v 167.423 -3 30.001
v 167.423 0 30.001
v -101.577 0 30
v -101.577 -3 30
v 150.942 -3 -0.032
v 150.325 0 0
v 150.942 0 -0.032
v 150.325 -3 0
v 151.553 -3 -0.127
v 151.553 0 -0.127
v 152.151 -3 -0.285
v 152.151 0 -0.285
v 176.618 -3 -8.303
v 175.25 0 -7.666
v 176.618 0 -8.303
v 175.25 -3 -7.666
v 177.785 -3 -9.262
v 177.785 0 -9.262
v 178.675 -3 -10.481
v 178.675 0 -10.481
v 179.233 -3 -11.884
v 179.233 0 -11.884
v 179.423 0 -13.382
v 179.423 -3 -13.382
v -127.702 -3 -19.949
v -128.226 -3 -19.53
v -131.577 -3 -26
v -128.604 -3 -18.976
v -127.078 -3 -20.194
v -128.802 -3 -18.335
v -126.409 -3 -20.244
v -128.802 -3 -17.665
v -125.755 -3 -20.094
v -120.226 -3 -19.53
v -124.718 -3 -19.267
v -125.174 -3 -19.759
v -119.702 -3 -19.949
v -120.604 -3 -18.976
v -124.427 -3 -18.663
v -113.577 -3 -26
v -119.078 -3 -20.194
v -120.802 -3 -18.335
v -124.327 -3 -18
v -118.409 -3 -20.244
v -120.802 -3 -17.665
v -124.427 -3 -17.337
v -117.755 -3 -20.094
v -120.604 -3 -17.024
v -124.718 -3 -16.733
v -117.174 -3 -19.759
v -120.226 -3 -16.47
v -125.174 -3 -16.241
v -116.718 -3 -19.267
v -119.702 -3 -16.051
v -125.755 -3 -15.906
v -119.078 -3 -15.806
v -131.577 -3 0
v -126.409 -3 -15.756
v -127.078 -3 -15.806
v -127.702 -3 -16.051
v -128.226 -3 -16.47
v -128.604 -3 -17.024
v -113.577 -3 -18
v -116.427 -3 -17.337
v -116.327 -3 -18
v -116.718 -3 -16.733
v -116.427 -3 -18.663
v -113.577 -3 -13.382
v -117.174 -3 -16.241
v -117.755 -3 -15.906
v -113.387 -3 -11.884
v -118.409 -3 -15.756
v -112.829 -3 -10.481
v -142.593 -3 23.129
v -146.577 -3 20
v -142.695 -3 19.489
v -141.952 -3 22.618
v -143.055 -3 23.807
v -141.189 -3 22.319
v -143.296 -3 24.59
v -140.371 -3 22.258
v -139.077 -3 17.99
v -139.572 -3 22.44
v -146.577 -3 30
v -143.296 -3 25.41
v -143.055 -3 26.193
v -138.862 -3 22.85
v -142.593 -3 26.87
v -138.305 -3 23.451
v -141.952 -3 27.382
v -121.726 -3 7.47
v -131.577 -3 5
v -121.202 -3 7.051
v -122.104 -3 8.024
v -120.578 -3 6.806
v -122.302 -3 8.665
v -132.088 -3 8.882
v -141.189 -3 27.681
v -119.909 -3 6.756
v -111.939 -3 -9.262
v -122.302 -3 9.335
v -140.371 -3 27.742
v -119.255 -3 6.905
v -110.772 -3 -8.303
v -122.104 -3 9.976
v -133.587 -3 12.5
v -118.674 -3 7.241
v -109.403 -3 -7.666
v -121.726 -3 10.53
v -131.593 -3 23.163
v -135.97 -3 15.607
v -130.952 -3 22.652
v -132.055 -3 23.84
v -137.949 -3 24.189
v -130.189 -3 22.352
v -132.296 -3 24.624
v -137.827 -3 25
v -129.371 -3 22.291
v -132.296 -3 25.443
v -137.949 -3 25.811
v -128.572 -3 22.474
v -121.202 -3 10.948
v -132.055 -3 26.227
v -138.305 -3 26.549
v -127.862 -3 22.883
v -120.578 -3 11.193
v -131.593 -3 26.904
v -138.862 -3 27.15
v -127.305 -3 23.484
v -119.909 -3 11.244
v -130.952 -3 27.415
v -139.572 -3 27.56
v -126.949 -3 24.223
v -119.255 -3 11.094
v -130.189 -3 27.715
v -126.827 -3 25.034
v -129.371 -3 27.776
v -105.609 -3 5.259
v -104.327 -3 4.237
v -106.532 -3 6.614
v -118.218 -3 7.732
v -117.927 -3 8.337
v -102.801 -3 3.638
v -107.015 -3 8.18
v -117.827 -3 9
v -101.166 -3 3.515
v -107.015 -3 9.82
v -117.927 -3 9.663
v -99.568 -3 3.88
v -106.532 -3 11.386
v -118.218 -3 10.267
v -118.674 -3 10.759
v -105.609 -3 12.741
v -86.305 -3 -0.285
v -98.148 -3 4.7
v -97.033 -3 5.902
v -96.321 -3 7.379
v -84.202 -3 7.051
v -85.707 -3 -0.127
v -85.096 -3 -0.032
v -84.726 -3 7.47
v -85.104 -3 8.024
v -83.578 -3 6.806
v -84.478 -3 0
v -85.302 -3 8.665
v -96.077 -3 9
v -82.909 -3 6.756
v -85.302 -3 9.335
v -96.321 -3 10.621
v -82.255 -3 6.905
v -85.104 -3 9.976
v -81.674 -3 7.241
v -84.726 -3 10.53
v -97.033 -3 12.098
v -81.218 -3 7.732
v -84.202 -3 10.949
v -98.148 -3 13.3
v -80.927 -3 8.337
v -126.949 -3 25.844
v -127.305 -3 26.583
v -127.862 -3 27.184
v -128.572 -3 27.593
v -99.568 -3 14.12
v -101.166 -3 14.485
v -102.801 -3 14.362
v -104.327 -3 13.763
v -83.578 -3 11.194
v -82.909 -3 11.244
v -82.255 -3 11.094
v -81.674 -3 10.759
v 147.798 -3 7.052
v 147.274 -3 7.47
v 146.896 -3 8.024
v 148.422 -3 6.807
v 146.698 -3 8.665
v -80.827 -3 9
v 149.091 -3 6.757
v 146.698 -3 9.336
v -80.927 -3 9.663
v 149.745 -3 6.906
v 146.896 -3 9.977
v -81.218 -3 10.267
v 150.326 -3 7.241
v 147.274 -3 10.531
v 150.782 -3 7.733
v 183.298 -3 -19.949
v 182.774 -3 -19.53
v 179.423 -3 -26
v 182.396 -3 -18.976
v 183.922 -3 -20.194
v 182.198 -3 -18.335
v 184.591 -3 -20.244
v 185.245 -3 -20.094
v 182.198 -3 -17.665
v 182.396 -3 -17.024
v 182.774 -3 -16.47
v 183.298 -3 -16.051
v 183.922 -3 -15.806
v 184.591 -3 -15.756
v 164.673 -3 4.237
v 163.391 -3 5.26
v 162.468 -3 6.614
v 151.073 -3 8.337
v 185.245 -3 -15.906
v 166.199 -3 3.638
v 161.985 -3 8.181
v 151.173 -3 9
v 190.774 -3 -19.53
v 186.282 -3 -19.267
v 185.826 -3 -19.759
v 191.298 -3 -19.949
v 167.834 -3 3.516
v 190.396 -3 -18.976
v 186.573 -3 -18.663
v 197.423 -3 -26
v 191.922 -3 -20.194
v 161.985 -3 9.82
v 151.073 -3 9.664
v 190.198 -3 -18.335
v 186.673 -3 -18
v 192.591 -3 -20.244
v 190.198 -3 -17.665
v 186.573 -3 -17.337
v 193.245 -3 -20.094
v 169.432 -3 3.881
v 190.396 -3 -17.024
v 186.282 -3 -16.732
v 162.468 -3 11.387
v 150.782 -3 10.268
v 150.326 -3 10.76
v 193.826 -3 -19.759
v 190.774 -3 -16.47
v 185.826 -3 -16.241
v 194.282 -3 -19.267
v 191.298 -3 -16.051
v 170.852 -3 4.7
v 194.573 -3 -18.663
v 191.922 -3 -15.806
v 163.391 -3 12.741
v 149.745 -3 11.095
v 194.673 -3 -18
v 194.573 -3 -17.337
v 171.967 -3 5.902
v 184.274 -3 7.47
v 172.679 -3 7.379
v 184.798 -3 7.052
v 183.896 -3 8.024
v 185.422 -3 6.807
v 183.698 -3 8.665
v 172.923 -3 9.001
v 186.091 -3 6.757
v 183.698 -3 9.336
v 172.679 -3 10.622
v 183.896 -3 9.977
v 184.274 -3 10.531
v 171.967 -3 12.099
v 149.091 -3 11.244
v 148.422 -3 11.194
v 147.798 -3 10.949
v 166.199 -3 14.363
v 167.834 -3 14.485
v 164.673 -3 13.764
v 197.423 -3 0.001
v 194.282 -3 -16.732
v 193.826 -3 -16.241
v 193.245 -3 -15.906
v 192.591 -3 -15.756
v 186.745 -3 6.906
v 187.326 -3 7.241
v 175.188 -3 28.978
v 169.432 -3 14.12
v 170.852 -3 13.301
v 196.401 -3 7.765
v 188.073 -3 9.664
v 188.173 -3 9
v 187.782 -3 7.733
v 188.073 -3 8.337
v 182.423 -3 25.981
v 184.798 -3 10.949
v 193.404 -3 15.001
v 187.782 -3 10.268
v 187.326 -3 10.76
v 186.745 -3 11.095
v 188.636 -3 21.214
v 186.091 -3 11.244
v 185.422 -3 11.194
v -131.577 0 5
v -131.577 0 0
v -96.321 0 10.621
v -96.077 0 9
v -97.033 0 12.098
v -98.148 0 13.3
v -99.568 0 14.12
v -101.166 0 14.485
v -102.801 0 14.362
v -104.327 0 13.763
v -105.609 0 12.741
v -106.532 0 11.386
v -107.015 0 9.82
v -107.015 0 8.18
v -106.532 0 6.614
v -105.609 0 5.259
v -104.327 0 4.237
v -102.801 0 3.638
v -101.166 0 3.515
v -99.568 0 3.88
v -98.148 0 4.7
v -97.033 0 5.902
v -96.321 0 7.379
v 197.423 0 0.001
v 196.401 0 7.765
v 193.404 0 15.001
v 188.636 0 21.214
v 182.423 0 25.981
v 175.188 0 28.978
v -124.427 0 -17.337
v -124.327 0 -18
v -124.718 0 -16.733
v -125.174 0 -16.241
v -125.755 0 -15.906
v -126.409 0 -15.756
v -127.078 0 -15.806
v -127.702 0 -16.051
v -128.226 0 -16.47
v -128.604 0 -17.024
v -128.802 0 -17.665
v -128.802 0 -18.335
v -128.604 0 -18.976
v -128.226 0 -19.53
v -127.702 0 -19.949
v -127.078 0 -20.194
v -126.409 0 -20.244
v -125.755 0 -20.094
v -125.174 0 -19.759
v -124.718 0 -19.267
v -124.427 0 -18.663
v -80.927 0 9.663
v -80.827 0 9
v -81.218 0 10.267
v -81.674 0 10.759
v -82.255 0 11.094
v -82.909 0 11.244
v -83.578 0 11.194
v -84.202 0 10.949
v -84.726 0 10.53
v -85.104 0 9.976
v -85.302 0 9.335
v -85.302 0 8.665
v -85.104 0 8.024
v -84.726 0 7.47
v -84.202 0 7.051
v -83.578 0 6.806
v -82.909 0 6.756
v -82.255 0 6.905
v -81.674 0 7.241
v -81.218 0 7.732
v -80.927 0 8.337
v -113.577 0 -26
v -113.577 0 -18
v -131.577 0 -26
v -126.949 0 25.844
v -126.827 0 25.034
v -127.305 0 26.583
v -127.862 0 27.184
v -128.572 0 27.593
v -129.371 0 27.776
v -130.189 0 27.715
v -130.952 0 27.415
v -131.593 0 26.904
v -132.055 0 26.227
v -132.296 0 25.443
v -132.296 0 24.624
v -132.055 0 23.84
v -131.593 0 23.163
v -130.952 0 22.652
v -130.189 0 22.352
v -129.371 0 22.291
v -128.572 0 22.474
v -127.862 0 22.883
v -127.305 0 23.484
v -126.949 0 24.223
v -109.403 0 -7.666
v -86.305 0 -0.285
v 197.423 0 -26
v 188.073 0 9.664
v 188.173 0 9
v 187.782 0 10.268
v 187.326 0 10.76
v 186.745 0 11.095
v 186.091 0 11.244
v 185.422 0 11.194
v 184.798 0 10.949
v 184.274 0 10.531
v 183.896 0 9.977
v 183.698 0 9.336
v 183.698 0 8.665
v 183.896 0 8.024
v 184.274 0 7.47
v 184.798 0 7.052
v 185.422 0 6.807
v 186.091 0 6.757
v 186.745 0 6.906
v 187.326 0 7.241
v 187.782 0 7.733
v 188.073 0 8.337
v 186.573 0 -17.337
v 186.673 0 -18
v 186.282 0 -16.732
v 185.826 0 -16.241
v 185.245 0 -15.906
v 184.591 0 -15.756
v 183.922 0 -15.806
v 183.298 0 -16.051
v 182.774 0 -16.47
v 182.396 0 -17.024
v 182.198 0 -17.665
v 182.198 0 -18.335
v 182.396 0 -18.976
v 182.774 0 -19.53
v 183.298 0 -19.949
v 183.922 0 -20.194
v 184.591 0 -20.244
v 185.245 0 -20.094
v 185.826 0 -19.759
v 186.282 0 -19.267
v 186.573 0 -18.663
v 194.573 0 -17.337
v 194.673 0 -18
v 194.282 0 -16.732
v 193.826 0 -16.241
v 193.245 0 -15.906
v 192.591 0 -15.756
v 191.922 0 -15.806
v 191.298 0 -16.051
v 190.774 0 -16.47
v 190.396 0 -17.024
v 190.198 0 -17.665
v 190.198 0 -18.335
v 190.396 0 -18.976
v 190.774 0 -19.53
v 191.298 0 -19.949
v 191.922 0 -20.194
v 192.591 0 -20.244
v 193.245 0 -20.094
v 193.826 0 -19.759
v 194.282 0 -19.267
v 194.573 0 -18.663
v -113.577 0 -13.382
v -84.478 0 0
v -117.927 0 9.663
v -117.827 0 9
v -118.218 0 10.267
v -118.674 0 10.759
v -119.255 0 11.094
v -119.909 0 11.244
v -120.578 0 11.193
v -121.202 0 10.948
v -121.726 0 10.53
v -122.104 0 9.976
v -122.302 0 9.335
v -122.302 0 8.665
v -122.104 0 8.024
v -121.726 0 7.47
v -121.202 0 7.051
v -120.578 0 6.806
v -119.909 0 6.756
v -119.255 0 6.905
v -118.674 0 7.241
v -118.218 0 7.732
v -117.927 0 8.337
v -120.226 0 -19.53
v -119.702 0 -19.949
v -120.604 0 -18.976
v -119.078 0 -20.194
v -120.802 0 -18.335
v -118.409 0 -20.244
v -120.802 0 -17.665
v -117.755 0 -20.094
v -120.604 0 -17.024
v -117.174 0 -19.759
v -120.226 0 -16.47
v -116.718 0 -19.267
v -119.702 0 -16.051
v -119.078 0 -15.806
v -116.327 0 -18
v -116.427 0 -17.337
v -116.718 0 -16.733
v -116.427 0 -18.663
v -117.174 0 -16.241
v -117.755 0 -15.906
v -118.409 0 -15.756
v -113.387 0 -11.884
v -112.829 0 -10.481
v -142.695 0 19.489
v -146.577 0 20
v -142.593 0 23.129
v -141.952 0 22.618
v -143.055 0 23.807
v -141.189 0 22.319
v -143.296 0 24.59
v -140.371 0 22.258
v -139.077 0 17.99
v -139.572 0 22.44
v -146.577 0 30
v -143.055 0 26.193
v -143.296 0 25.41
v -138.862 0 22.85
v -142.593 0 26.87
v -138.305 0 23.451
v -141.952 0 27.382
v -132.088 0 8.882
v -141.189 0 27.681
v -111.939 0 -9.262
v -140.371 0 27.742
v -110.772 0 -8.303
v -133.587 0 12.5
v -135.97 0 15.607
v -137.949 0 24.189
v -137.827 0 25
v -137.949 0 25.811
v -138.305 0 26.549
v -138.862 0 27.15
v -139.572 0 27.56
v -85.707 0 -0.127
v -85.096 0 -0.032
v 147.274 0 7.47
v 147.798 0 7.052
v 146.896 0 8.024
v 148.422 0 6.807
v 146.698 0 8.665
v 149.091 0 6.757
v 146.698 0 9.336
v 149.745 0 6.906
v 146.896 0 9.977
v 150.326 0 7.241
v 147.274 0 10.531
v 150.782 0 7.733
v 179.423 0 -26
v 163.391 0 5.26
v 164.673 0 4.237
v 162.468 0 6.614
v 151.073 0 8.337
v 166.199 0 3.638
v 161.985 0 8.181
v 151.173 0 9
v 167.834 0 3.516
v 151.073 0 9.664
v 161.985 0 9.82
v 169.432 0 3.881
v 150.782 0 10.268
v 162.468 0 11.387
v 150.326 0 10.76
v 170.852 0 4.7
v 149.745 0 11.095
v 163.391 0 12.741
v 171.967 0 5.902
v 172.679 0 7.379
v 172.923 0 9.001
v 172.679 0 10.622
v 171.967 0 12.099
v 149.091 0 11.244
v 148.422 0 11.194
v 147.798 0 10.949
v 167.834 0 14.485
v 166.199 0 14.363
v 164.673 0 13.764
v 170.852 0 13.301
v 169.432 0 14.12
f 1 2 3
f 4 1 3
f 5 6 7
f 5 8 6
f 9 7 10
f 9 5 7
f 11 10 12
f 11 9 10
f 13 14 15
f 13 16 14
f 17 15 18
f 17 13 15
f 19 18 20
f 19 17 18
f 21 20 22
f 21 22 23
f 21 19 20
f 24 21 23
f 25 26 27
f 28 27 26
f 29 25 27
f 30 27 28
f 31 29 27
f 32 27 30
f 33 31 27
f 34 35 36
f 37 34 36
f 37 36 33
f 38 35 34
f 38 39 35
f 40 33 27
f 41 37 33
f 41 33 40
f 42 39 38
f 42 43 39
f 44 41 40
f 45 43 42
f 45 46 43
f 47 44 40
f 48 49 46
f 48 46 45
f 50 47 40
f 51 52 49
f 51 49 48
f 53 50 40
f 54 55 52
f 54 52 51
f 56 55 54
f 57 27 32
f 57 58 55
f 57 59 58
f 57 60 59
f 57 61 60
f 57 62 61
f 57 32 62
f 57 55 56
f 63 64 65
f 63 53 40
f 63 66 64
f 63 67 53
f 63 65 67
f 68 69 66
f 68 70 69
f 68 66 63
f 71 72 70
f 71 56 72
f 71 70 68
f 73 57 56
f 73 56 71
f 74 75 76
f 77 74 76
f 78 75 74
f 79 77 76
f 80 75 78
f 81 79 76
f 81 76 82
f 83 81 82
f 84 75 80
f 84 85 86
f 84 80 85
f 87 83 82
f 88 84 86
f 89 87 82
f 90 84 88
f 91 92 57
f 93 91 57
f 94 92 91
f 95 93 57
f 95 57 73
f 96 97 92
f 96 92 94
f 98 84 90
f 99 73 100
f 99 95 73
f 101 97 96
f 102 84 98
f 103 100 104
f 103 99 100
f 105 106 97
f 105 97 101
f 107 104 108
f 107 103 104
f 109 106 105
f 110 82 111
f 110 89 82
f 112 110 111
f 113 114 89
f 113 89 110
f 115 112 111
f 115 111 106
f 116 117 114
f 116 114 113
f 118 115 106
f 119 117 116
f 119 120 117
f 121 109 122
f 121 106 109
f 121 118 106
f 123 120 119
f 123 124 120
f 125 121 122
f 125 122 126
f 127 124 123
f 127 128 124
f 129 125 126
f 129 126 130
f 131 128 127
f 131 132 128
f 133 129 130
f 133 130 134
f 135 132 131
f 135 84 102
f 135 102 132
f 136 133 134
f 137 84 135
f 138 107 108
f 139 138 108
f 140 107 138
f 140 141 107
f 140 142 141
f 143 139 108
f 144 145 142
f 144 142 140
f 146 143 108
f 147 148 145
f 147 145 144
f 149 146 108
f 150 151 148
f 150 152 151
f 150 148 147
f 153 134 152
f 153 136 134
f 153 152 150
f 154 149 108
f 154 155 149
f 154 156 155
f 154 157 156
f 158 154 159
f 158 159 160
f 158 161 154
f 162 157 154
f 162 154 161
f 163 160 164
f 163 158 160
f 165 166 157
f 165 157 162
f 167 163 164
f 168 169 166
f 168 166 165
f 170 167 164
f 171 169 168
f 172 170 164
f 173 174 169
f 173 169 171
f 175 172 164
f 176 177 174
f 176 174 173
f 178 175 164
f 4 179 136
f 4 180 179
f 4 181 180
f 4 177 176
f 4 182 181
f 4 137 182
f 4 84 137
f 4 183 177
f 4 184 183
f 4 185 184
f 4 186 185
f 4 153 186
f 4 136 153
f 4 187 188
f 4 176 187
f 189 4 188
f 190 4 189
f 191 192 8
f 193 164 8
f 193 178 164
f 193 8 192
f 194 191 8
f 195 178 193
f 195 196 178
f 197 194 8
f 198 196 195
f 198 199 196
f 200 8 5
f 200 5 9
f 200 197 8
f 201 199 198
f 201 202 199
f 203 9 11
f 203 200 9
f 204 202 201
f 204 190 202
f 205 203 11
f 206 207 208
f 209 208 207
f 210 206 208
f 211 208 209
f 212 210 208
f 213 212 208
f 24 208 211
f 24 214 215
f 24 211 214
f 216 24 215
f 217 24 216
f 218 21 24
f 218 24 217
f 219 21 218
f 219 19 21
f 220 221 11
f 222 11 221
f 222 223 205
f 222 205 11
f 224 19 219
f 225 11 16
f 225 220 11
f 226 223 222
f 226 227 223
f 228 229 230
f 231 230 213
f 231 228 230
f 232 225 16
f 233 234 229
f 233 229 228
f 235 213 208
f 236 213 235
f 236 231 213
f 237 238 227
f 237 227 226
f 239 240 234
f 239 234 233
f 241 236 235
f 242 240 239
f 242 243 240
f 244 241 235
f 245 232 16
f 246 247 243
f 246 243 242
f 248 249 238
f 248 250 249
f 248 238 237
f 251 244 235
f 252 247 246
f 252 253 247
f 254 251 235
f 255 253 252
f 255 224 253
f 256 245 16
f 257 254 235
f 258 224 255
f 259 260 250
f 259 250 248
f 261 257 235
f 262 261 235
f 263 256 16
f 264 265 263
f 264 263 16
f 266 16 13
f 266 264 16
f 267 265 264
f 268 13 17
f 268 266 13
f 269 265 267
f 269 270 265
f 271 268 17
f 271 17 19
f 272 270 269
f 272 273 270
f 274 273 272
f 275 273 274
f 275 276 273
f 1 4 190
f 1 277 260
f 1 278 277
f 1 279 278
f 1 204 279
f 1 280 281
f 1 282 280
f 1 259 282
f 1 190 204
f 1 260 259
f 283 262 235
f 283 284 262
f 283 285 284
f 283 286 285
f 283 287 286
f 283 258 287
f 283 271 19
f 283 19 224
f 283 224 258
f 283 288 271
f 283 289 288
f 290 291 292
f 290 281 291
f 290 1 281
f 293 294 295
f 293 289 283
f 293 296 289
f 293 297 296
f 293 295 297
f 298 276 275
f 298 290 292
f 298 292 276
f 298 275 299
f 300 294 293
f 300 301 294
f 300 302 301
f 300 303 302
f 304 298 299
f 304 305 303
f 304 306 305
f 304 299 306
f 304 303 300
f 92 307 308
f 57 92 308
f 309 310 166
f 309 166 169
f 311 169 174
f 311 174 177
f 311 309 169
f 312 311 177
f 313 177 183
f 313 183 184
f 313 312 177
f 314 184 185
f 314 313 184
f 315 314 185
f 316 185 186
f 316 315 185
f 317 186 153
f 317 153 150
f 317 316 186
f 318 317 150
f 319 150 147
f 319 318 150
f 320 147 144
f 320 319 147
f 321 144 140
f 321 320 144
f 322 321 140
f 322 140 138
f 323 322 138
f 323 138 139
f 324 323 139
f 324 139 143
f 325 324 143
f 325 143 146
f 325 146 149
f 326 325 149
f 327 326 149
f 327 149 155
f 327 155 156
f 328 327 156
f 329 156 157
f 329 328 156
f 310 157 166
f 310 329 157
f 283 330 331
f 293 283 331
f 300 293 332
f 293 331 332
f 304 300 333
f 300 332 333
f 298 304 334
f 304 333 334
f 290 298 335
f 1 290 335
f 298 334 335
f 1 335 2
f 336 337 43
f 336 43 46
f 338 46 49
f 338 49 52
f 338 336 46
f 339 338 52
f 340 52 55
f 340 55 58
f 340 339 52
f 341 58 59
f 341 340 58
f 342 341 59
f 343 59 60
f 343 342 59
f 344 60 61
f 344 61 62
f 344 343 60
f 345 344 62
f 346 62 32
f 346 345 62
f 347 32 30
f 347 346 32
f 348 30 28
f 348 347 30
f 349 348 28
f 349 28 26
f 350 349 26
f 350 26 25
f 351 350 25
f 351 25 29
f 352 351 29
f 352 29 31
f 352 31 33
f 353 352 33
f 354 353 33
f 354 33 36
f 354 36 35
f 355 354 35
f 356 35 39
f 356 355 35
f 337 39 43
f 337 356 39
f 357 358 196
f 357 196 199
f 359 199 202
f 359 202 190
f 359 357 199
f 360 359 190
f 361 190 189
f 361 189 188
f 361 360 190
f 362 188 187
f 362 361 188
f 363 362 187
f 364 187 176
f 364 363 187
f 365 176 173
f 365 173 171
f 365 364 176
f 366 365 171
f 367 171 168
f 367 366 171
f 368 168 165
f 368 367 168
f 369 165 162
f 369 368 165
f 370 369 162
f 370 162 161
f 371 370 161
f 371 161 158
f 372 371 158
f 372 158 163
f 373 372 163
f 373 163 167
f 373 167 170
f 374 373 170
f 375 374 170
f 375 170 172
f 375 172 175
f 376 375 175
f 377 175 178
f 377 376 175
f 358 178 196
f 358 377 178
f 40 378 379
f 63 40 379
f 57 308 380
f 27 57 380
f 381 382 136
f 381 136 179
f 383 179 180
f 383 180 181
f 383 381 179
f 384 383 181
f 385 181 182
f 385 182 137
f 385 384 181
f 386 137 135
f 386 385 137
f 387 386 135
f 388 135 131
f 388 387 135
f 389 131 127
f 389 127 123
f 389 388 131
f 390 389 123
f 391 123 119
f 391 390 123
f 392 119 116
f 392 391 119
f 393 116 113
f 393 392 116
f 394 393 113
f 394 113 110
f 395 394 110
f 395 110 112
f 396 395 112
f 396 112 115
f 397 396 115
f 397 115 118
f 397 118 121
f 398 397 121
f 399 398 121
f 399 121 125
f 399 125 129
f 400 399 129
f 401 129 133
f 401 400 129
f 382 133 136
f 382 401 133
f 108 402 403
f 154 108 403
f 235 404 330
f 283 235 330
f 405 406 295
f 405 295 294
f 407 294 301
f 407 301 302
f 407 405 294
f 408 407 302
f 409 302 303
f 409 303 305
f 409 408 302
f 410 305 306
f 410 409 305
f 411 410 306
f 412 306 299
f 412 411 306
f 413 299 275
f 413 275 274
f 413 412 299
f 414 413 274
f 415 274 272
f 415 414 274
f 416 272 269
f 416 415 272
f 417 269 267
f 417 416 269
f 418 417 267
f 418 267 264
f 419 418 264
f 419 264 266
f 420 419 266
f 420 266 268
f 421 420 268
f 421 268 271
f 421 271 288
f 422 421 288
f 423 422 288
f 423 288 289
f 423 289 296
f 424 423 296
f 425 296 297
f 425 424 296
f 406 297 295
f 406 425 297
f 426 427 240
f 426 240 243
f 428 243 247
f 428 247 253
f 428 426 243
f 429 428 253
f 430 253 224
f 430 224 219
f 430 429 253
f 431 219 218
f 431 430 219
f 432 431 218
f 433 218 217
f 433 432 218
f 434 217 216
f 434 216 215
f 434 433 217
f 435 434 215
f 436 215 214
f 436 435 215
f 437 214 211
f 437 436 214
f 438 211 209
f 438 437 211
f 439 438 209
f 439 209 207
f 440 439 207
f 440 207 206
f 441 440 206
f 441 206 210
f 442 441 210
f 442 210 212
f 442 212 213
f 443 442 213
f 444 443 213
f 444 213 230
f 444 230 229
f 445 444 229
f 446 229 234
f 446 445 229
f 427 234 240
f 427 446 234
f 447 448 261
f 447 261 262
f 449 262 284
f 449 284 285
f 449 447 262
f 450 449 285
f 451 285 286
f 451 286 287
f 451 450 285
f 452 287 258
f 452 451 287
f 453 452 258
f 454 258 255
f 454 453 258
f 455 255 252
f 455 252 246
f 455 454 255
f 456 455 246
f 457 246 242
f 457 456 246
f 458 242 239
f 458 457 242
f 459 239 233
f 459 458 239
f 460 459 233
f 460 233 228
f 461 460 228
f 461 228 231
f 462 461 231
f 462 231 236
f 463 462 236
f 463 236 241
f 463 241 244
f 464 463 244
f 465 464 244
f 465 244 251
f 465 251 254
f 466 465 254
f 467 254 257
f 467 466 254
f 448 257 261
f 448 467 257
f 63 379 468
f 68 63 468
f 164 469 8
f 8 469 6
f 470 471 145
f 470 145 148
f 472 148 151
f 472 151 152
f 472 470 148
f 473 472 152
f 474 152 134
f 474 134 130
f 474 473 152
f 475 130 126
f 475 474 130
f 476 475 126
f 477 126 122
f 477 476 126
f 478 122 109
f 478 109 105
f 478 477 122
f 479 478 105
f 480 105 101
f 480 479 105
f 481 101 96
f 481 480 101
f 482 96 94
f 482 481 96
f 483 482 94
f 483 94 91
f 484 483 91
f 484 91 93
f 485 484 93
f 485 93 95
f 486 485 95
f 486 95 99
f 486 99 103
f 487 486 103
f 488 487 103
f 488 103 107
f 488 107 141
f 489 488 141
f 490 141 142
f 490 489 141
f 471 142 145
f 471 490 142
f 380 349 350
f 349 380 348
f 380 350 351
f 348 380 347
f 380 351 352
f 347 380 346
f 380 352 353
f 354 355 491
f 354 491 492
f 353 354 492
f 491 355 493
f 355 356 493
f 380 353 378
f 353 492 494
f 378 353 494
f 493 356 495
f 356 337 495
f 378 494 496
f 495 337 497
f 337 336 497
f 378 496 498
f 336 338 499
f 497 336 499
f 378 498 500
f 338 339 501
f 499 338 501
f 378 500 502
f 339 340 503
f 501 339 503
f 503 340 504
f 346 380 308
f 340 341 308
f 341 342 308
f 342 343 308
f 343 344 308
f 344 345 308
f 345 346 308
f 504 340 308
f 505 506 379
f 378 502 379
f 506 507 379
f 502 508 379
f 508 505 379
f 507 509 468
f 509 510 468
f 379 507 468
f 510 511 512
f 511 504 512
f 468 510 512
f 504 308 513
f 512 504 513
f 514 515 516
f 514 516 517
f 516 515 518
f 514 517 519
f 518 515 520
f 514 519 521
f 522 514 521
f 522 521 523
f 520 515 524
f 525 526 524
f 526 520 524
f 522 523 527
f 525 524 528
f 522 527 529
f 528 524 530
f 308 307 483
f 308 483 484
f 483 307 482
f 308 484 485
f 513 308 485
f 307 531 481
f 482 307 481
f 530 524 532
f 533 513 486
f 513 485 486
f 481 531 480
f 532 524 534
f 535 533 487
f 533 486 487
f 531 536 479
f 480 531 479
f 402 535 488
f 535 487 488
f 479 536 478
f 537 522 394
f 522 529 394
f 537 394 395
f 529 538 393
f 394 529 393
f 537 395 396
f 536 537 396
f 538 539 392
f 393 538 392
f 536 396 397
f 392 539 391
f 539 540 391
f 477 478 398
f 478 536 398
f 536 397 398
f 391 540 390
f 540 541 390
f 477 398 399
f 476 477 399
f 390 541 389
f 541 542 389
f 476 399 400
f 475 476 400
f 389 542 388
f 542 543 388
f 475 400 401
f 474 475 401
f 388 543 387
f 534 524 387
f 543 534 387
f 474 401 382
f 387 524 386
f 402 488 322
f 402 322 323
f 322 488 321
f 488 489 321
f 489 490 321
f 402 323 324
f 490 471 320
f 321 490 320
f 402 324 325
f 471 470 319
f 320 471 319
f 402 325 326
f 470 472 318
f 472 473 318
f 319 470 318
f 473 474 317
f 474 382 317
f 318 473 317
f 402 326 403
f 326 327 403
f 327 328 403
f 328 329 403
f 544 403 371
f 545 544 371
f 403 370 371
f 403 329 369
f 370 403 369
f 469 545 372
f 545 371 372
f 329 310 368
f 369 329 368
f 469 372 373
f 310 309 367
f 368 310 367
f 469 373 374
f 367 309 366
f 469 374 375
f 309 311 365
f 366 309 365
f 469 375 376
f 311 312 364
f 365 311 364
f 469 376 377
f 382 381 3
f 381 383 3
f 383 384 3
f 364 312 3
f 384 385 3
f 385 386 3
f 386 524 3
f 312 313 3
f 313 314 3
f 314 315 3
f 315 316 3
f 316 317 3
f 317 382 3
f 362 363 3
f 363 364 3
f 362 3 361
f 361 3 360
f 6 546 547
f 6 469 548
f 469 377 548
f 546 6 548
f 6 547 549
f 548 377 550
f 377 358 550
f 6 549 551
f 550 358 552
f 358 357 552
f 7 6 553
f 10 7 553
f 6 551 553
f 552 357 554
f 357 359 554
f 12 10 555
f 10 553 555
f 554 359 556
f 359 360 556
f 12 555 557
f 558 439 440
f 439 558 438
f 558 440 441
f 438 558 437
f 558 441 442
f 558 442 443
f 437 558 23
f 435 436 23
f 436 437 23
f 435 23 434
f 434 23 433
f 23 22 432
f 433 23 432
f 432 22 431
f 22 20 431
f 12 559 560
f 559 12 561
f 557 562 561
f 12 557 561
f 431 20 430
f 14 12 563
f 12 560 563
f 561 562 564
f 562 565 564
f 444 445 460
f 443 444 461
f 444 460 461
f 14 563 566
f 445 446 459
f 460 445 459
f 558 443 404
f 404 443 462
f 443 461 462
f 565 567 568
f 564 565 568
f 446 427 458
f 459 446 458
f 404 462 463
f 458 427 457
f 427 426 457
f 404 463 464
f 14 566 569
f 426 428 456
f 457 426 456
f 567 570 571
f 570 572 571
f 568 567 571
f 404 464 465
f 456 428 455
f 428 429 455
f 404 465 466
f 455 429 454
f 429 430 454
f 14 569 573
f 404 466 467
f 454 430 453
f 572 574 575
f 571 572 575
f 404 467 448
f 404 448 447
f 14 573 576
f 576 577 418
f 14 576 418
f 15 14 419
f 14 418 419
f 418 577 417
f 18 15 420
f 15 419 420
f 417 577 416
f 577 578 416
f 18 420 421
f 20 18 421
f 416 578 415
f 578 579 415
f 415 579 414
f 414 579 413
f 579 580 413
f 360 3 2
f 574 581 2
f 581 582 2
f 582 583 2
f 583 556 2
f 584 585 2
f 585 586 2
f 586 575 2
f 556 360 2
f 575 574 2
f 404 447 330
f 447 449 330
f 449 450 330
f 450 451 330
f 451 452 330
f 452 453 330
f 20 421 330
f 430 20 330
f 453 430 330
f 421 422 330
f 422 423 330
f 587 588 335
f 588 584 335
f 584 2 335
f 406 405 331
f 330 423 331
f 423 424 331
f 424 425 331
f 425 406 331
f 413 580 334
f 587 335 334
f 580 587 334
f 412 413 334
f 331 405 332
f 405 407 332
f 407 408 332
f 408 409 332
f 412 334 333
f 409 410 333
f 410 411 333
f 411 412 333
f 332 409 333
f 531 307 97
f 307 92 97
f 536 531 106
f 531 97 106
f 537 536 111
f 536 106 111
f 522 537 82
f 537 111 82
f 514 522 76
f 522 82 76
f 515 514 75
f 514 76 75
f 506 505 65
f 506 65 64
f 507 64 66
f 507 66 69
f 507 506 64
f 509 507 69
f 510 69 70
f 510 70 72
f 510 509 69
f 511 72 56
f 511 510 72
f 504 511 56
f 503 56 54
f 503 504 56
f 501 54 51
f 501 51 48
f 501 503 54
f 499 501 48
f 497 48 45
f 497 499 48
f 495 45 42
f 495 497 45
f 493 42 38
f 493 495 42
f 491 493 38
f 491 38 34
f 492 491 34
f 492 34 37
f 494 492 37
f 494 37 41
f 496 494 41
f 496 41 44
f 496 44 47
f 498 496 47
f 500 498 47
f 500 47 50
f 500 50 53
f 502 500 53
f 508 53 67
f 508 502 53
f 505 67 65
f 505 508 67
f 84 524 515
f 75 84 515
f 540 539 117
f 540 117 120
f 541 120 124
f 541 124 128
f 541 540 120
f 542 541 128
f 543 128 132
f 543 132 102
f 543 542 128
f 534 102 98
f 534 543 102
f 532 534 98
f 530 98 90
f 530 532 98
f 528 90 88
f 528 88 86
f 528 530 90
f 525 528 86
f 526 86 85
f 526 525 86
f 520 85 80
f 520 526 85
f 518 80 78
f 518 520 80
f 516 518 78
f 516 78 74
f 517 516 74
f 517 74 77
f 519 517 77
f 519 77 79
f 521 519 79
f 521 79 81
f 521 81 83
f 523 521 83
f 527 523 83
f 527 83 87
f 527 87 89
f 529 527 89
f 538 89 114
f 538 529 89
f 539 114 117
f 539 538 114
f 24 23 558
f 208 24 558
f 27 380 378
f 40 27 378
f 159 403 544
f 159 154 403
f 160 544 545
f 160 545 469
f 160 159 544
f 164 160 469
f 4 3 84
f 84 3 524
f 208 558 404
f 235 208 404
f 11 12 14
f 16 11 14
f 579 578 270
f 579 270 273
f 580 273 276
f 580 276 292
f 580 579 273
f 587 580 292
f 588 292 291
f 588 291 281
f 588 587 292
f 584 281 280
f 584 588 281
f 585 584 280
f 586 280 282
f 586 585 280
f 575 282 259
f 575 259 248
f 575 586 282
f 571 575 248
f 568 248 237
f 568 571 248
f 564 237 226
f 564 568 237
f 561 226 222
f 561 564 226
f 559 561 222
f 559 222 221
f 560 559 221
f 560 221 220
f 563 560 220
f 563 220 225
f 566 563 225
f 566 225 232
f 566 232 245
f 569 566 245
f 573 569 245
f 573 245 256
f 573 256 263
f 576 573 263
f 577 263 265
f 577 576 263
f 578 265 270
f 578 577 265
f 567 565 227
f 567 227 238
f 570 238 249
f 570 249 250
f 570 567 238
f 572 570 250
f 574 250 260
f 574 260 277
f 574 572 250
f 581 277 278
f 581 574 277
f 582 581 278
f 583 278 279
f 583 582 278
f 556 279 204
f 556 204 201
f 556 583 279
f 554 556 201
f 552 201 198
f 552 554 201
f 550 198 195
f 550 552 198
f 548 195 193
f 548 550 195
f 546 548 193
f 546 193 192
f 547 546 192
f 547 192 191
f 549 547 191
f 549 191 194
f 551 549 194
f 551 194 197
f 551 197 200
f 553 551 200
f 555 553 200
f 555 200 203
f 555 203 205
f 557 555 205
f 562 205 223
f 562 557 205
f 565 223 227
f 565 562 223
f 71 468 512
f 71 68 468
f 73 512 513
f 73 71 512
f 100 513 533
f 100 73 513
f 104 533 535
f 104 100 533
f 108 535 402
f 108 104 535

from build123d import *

# Parameters (mm, degrees)
F0_R     = 2.25
F0_R_2   = 5.5
F0_R_3   = 2.75
F1_DEPTH = 3
F2_R     = 6
F3_R     = 15


# Not quite as in the source:
# - ends of sketch curves that miss each other by under 0.0002 mm in the source are joined


with BuildPart() as f1:
    # F0 (on Front) → F1 (new body)
    with BuildSketch(Plane.XZ):
        with BuildLine():
            Line((167.4230358146, 30.0005254045), (-101.5769641849, 30.0000224371))
            ThreePointArc((-101.5769641849, 30.0000224371), (-122.790151189, 21.2131862095), (-131.576908088, -3.36535e-05))
            Line((-131.576908088, -3.36535e-05), (-131.5768594728, -26.0000336567))
            Line((-131.5768594728, -26.0000336567), (-113.5768594728, -26))
            Line((-113.5768594728, -26), (-113.5768594728, -18))
            Line((-113.5768594728, -18), (-113.57685947, -9))
            Line((-113.57685947, -9), (-113.5768594672, 0))
            Line((-113.5768594672, 0), (-85.4137075401, 0))
            Line((-85.4137075401, 0), (149.4231405226, 0))
            Line((149.4231405226, 0), (151.260137769, 0))
            Line((151.260137769, 0), (179.4231405277, -8.9999831717))
            Line((179.4231405277, -8.9999831717), (179.4231405277, -17.9999663433))
            Line((179.4231405277, -17.9999663433), (179.4231405277, -26))
            Line((179.4231405277, -26), (197.4231405276, -25.9999663433))
            Line((197.4231405276, -25.9999663433), (197.4230919114, 0.0005814952))
            ThreePointArc((197.4230919114, 0.0005814952), (188.6362556816, 21.2137685033), (167.4230358146, 30.0005254045))
        make_face()
        with Locations((-126.5768744313, -18.0000243076)):
            Circle(F0_R, mode=Mode.SUBTRACT)
        with Locations((-118.5768744313, -18.0000093491)):
            Circle(F0_R, mode=Mode.SUBTRACT)
        with Locations((184.4231255691, -17.9999663433)):
            Circle(F0_R, mode=Mode.SUBTRACT)
        with Locations((192.4231255691, -17.9999663442)):
            Circle(F0_R, mode=Mode.SUBTRACT)
        with Locations((-120.0769249193, 8.9998906191)):
            Circle(F0_R, mode=Mode.SUBTRACT)
        with Locations((-101.5769249198, 9.0000224409)):
            Circle(F0_R_2, mode=Mode.SUBTRACT)
        with Locations((-83.0769249199, 8.9999598022)):
            Circle(F0_R, mode=Mode.SUBTRACT)
        with Locations((148.9230750802, 9.0003935993)):
            Circle(F0_R, mode=Mode.SUBTRACT)
        with Locations((167.4230750797, 9.0005254008)):
            Circle(F0_R_2, mode=Mode.SUBTRACT)
        with Locations((185.9230750796, 9.0004627825)):
            Circle(F0_R, mode=Mode.SUBTRACT)
        with BuildLine():
            ThreePointArc((-131.576908088, -3.36535e-05), (-122.790151189, 21.2131862095), (-101.5769641849, 30.0000224371))
            Line((-101.5769641849, 30.0000224371), (-146.5769641849, 29.999966344))
            Line((-146.5769641849, 29.999966344), (-146.5769517198, 19.999966344))
            Line((-146.5769517198, 19.999966344), (-131.576908088, 19.999966344))
            Line((-131.576908088, 19.999966344), (-131.576908088, -3.36535e-05))
        make_face()
        with Locations((-140.5769579523, 24.999966344)):
            Circle(F0_R_3, mode=Mode.SUBTRACT)
        with Locations((-129.5769910358, 25.0335049432)):
            Circle(F0_R_3, mode=Mode.SUBTRACT)
        Polygon((-113.5768594672, 0), (-113.57685947, -9), (-85.4137075401, 0), align=None)
    extrude(amount=F1_DEPTH)

    # F2
    f2_edges = [f1.edges().sort_by_distance(p)[0] for p in [
        (-113.576859, -1.5, -9),
        (-85.413708, -1.5, 0),
        (151.260138, -1.5, 0),
        (179.423141, -1.5, -8.999983),
    ]]
    fillet(f2_edges, radius=F2_R)

    # F3
    f3_edges = [f1.edges().sort_by_distance(p)[0] for p in [
        (-131.576908, -1.5, 19.999966),
    ]]
    fillet(f3_edges, radius=F3_R)


solid = f1.part
